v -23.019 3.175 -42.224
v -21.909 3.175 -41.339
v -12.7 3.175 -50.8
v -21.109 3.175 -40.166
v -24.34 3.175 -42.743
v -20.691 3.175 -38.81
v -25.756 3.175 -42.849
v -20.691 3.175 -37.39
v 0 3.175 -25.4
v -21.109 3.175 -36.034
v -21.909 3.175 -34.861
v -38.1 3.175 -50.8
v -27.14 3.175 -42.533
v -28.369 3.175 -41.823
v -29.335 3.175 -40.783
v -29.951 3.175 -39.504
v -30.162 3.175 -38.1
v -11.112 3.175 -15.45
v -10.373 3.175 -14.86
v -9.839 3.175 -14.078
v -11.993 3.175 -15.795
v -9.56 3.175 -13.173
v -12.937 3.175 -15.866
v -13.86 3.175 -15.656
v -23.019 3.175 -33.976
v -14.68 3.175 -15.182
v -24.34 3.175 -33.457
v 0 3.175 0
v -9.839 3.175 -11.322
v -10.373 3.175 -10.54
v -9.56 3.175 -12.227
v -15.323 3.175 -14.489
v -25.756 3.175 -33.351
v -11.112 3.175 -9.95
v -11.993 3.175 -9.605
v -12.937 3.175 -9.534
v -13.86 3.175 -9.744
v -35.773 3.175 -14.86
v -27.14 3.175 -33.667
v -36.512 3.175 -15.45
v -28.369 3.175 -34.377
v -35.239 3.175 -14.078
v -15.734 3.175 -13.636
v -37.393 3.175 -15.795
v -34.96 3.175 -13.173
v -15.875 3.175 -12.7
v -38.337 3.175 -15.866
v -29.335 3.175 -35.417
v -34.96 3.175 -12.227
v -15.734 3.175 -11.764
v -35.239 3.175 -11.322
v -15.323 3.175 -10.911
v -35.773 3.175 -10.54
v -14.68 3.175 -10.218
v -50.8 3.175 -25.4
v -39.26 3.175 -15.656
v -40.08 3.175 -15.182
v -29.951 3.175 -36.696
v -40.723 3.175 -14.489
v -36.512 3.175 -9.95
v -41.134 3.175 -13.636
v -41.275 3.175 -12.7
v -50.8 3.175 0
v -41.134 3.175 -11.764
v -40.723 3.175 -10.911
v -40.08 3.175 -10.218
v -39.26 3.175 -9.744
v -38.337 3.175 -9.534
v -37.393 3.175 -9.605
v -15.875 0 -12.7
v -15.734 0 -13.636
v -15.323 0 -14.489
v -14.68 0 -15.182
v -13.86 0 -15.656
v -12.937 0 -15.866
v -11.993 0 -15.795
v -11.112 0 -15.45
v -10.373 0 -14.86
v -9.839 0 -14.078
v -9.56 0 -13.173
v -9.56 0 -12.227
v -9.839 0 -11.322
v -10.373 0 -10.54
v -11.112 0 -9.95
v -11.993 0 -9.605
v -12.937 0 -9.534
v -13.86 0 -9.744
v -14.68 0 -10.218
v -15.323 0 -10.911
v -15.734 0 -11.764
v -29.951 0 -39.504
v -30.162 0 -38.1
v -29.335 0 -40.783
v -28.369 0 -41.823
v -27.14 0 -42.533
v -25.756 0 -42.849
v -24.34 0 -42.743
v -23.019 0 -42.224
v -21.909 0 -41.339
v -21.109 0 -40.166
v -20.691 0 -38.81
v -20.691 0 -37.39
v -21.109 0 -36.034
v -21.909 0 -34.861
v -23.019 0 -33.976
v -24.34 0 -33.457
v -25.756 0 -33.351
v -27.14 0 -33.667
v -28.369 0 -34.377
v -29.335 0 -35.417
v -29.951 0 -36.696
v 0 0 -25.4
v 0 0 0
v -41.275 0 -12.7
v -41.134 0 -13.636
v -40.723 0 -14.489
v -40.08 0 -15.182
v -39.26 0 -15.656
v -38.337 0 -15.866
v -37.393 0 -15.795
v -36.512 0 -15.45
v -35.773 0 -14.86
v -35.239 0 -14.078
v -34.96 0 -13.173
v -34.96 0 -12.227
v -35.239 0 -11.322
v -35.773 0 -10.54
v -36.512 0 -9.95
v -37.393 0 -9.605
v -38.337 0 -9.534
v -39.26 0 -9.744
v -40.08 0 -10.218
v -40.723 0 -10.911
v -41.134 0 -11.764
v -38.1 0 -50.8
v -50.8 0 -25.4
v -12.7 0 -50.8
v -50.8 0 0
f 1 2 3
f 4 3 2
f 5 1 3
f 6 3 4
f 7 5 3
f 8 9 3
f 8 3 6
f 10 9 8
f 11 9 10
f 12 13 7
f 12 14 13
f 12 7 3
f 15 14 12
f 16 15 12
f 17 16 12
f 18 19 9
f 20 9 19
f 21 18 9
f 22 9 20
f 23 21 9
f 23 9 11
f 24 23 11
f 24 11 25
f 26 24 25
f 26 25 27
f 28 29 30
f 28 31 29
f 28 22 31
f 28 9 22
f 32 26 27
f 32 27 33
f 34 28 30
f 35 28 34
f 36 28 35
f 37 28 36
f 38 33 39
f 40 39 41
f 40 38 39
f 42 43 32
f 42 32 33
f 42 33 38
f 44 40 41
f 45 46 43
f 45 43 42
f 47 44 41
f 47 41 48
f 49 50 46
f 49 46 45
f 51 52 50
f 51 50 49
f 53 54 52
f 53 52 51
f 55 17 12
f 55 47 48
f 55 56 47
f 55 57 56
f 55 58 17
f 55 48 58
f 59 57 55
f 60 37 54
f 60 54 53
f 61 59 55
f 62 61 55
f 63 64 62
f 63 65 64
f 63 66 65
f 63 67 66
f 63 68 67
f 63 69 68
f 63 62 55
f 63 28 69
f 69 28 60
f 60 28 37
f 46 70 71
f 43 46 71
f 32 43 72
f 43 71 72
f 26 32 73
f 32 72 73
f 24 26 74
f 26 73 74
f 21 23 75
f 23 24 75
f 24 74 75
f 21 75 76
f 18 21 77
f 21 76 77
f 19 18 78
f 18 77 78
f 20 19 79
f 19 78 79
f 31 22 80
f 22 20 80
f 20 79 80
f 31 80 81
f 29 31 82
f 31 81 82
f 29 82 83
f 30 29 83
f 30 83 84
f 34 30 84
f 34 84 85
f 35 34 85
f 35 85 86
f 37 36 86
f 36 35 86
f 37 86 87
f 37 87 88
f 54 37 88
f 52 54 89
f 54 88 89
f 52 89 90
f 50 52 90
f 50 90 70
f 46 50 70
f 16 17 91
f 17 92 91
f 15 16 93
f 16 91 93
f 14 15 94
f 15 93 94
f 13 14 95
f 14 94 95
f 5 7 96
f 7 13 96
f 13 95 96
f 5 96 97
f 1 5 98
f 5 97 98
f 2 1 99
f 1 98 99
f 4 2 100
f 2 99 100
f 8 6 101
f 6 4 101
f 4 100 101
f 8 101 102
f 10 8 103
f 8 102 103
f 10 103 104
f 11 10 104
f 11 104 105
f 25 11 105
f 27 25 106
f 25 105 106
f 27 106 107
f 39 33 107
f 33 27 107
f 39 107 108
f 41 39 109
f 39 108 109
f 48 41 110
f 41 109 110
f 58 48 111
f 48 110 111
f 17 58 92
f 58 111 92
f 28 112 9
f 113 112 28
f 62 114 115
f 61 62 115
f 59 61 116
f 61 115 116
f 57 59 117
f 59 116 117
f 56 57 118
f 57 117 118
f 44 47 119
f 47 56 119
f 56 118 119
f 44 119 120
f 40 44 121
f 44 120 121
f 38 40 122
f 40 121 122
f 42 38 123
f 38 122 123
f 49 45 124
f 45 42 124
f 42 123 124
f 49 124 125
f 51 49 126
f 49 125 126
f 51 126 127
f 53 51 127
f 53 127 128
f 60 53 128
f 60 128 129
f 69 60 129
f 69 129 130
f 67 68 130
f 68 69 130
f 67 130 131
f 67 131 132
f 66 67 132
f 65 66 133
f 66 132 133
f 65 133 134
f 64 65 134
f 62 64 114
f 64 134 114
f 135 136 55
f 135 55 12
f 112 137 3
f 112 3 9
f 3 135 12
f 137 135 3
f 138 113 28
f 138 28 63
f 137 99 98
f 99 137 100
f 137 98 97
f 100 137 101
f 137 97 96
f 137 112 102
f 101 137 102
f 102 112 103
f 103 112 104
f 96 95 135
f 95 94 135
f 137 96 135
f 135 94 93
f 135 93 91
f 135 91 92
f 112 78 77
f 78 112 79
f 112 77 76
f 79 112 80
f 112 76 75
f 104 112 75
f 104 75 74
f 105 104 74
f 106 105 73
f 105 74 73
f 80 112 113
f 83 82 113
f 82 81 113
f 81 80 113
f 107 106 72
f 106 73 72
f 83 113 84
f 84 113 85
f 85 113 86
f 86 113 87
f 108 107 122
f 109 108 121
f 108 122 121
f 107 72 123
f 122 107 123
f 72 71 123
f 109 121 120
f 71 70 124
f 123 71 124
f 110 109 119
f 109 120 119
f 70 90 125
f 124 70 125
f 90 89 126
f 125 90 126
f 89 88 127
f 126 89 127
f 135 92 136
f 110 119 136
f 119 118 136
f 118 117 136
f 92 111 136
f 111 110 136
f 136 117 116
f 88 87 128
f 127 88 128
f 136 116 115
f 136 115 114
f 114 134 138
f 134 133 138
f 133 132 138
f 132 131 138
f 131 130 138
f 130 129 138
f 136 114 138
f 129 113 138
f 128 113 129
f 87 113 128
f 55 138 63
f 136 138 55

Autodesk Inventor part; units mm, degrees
ref_plane "YZ Plane" through (0, 0, 0) normal (1, 0, 0) x (0, 1, 0)
ref_plane "XZ Plane" through (0, 0, 0) normal (0, 1, 0) x (-1, 0, 0)
ref_plane "XY Plane" through (0, 0, 0) normal (0, 0, 1) x (1, 0, 0)
sketch "Sketch1" plane through (0, 0, 0) normal (0, 1, 0) x (-1, 0, 0)
  line L0 (0, 0) -> (50.8, 0)
  line L1 (50.8, 0) -> (50.8, -25.4)
  line L2 (50.8, -25.4) -> (38.1, -50.8)
  line L3 (38.1, -50.8) -> (12.7, -50.8)
  line L4 (12.7, -50.8) -> (0, -25.4)
  line L5 (0, -25.4) -> (0, 0)
  circle A0 centre (12.7, -12.7) radius 3.175
  circle A1 centre (38.1, -12.7) radius 3.175
  circle A2 centre (25.4, -38.1) radius 4.7625
  dimension "d0" = 25.4
  dimension "d1" = 50.8
  dimension "d2" = 25.4
  dimension "d3" = 50.8
  dimension "d4" = 12.7
  dimension "d5" = 6.35
  dimension "d6" = 6.35
  dimension "d7" = 12.7
  dimension "d8" = 12.7
  dimension "d9" = 12.7
  dimension "d10" = 12.7
  dimension "d11" = 9.525
  dimension "d12" = 12.7
  dimension "d13" = 12.7
extrude "Extrusion1" add sketch "Sketch1" along normal blind 3.175
properties part number "15102898-16-P-0212"
